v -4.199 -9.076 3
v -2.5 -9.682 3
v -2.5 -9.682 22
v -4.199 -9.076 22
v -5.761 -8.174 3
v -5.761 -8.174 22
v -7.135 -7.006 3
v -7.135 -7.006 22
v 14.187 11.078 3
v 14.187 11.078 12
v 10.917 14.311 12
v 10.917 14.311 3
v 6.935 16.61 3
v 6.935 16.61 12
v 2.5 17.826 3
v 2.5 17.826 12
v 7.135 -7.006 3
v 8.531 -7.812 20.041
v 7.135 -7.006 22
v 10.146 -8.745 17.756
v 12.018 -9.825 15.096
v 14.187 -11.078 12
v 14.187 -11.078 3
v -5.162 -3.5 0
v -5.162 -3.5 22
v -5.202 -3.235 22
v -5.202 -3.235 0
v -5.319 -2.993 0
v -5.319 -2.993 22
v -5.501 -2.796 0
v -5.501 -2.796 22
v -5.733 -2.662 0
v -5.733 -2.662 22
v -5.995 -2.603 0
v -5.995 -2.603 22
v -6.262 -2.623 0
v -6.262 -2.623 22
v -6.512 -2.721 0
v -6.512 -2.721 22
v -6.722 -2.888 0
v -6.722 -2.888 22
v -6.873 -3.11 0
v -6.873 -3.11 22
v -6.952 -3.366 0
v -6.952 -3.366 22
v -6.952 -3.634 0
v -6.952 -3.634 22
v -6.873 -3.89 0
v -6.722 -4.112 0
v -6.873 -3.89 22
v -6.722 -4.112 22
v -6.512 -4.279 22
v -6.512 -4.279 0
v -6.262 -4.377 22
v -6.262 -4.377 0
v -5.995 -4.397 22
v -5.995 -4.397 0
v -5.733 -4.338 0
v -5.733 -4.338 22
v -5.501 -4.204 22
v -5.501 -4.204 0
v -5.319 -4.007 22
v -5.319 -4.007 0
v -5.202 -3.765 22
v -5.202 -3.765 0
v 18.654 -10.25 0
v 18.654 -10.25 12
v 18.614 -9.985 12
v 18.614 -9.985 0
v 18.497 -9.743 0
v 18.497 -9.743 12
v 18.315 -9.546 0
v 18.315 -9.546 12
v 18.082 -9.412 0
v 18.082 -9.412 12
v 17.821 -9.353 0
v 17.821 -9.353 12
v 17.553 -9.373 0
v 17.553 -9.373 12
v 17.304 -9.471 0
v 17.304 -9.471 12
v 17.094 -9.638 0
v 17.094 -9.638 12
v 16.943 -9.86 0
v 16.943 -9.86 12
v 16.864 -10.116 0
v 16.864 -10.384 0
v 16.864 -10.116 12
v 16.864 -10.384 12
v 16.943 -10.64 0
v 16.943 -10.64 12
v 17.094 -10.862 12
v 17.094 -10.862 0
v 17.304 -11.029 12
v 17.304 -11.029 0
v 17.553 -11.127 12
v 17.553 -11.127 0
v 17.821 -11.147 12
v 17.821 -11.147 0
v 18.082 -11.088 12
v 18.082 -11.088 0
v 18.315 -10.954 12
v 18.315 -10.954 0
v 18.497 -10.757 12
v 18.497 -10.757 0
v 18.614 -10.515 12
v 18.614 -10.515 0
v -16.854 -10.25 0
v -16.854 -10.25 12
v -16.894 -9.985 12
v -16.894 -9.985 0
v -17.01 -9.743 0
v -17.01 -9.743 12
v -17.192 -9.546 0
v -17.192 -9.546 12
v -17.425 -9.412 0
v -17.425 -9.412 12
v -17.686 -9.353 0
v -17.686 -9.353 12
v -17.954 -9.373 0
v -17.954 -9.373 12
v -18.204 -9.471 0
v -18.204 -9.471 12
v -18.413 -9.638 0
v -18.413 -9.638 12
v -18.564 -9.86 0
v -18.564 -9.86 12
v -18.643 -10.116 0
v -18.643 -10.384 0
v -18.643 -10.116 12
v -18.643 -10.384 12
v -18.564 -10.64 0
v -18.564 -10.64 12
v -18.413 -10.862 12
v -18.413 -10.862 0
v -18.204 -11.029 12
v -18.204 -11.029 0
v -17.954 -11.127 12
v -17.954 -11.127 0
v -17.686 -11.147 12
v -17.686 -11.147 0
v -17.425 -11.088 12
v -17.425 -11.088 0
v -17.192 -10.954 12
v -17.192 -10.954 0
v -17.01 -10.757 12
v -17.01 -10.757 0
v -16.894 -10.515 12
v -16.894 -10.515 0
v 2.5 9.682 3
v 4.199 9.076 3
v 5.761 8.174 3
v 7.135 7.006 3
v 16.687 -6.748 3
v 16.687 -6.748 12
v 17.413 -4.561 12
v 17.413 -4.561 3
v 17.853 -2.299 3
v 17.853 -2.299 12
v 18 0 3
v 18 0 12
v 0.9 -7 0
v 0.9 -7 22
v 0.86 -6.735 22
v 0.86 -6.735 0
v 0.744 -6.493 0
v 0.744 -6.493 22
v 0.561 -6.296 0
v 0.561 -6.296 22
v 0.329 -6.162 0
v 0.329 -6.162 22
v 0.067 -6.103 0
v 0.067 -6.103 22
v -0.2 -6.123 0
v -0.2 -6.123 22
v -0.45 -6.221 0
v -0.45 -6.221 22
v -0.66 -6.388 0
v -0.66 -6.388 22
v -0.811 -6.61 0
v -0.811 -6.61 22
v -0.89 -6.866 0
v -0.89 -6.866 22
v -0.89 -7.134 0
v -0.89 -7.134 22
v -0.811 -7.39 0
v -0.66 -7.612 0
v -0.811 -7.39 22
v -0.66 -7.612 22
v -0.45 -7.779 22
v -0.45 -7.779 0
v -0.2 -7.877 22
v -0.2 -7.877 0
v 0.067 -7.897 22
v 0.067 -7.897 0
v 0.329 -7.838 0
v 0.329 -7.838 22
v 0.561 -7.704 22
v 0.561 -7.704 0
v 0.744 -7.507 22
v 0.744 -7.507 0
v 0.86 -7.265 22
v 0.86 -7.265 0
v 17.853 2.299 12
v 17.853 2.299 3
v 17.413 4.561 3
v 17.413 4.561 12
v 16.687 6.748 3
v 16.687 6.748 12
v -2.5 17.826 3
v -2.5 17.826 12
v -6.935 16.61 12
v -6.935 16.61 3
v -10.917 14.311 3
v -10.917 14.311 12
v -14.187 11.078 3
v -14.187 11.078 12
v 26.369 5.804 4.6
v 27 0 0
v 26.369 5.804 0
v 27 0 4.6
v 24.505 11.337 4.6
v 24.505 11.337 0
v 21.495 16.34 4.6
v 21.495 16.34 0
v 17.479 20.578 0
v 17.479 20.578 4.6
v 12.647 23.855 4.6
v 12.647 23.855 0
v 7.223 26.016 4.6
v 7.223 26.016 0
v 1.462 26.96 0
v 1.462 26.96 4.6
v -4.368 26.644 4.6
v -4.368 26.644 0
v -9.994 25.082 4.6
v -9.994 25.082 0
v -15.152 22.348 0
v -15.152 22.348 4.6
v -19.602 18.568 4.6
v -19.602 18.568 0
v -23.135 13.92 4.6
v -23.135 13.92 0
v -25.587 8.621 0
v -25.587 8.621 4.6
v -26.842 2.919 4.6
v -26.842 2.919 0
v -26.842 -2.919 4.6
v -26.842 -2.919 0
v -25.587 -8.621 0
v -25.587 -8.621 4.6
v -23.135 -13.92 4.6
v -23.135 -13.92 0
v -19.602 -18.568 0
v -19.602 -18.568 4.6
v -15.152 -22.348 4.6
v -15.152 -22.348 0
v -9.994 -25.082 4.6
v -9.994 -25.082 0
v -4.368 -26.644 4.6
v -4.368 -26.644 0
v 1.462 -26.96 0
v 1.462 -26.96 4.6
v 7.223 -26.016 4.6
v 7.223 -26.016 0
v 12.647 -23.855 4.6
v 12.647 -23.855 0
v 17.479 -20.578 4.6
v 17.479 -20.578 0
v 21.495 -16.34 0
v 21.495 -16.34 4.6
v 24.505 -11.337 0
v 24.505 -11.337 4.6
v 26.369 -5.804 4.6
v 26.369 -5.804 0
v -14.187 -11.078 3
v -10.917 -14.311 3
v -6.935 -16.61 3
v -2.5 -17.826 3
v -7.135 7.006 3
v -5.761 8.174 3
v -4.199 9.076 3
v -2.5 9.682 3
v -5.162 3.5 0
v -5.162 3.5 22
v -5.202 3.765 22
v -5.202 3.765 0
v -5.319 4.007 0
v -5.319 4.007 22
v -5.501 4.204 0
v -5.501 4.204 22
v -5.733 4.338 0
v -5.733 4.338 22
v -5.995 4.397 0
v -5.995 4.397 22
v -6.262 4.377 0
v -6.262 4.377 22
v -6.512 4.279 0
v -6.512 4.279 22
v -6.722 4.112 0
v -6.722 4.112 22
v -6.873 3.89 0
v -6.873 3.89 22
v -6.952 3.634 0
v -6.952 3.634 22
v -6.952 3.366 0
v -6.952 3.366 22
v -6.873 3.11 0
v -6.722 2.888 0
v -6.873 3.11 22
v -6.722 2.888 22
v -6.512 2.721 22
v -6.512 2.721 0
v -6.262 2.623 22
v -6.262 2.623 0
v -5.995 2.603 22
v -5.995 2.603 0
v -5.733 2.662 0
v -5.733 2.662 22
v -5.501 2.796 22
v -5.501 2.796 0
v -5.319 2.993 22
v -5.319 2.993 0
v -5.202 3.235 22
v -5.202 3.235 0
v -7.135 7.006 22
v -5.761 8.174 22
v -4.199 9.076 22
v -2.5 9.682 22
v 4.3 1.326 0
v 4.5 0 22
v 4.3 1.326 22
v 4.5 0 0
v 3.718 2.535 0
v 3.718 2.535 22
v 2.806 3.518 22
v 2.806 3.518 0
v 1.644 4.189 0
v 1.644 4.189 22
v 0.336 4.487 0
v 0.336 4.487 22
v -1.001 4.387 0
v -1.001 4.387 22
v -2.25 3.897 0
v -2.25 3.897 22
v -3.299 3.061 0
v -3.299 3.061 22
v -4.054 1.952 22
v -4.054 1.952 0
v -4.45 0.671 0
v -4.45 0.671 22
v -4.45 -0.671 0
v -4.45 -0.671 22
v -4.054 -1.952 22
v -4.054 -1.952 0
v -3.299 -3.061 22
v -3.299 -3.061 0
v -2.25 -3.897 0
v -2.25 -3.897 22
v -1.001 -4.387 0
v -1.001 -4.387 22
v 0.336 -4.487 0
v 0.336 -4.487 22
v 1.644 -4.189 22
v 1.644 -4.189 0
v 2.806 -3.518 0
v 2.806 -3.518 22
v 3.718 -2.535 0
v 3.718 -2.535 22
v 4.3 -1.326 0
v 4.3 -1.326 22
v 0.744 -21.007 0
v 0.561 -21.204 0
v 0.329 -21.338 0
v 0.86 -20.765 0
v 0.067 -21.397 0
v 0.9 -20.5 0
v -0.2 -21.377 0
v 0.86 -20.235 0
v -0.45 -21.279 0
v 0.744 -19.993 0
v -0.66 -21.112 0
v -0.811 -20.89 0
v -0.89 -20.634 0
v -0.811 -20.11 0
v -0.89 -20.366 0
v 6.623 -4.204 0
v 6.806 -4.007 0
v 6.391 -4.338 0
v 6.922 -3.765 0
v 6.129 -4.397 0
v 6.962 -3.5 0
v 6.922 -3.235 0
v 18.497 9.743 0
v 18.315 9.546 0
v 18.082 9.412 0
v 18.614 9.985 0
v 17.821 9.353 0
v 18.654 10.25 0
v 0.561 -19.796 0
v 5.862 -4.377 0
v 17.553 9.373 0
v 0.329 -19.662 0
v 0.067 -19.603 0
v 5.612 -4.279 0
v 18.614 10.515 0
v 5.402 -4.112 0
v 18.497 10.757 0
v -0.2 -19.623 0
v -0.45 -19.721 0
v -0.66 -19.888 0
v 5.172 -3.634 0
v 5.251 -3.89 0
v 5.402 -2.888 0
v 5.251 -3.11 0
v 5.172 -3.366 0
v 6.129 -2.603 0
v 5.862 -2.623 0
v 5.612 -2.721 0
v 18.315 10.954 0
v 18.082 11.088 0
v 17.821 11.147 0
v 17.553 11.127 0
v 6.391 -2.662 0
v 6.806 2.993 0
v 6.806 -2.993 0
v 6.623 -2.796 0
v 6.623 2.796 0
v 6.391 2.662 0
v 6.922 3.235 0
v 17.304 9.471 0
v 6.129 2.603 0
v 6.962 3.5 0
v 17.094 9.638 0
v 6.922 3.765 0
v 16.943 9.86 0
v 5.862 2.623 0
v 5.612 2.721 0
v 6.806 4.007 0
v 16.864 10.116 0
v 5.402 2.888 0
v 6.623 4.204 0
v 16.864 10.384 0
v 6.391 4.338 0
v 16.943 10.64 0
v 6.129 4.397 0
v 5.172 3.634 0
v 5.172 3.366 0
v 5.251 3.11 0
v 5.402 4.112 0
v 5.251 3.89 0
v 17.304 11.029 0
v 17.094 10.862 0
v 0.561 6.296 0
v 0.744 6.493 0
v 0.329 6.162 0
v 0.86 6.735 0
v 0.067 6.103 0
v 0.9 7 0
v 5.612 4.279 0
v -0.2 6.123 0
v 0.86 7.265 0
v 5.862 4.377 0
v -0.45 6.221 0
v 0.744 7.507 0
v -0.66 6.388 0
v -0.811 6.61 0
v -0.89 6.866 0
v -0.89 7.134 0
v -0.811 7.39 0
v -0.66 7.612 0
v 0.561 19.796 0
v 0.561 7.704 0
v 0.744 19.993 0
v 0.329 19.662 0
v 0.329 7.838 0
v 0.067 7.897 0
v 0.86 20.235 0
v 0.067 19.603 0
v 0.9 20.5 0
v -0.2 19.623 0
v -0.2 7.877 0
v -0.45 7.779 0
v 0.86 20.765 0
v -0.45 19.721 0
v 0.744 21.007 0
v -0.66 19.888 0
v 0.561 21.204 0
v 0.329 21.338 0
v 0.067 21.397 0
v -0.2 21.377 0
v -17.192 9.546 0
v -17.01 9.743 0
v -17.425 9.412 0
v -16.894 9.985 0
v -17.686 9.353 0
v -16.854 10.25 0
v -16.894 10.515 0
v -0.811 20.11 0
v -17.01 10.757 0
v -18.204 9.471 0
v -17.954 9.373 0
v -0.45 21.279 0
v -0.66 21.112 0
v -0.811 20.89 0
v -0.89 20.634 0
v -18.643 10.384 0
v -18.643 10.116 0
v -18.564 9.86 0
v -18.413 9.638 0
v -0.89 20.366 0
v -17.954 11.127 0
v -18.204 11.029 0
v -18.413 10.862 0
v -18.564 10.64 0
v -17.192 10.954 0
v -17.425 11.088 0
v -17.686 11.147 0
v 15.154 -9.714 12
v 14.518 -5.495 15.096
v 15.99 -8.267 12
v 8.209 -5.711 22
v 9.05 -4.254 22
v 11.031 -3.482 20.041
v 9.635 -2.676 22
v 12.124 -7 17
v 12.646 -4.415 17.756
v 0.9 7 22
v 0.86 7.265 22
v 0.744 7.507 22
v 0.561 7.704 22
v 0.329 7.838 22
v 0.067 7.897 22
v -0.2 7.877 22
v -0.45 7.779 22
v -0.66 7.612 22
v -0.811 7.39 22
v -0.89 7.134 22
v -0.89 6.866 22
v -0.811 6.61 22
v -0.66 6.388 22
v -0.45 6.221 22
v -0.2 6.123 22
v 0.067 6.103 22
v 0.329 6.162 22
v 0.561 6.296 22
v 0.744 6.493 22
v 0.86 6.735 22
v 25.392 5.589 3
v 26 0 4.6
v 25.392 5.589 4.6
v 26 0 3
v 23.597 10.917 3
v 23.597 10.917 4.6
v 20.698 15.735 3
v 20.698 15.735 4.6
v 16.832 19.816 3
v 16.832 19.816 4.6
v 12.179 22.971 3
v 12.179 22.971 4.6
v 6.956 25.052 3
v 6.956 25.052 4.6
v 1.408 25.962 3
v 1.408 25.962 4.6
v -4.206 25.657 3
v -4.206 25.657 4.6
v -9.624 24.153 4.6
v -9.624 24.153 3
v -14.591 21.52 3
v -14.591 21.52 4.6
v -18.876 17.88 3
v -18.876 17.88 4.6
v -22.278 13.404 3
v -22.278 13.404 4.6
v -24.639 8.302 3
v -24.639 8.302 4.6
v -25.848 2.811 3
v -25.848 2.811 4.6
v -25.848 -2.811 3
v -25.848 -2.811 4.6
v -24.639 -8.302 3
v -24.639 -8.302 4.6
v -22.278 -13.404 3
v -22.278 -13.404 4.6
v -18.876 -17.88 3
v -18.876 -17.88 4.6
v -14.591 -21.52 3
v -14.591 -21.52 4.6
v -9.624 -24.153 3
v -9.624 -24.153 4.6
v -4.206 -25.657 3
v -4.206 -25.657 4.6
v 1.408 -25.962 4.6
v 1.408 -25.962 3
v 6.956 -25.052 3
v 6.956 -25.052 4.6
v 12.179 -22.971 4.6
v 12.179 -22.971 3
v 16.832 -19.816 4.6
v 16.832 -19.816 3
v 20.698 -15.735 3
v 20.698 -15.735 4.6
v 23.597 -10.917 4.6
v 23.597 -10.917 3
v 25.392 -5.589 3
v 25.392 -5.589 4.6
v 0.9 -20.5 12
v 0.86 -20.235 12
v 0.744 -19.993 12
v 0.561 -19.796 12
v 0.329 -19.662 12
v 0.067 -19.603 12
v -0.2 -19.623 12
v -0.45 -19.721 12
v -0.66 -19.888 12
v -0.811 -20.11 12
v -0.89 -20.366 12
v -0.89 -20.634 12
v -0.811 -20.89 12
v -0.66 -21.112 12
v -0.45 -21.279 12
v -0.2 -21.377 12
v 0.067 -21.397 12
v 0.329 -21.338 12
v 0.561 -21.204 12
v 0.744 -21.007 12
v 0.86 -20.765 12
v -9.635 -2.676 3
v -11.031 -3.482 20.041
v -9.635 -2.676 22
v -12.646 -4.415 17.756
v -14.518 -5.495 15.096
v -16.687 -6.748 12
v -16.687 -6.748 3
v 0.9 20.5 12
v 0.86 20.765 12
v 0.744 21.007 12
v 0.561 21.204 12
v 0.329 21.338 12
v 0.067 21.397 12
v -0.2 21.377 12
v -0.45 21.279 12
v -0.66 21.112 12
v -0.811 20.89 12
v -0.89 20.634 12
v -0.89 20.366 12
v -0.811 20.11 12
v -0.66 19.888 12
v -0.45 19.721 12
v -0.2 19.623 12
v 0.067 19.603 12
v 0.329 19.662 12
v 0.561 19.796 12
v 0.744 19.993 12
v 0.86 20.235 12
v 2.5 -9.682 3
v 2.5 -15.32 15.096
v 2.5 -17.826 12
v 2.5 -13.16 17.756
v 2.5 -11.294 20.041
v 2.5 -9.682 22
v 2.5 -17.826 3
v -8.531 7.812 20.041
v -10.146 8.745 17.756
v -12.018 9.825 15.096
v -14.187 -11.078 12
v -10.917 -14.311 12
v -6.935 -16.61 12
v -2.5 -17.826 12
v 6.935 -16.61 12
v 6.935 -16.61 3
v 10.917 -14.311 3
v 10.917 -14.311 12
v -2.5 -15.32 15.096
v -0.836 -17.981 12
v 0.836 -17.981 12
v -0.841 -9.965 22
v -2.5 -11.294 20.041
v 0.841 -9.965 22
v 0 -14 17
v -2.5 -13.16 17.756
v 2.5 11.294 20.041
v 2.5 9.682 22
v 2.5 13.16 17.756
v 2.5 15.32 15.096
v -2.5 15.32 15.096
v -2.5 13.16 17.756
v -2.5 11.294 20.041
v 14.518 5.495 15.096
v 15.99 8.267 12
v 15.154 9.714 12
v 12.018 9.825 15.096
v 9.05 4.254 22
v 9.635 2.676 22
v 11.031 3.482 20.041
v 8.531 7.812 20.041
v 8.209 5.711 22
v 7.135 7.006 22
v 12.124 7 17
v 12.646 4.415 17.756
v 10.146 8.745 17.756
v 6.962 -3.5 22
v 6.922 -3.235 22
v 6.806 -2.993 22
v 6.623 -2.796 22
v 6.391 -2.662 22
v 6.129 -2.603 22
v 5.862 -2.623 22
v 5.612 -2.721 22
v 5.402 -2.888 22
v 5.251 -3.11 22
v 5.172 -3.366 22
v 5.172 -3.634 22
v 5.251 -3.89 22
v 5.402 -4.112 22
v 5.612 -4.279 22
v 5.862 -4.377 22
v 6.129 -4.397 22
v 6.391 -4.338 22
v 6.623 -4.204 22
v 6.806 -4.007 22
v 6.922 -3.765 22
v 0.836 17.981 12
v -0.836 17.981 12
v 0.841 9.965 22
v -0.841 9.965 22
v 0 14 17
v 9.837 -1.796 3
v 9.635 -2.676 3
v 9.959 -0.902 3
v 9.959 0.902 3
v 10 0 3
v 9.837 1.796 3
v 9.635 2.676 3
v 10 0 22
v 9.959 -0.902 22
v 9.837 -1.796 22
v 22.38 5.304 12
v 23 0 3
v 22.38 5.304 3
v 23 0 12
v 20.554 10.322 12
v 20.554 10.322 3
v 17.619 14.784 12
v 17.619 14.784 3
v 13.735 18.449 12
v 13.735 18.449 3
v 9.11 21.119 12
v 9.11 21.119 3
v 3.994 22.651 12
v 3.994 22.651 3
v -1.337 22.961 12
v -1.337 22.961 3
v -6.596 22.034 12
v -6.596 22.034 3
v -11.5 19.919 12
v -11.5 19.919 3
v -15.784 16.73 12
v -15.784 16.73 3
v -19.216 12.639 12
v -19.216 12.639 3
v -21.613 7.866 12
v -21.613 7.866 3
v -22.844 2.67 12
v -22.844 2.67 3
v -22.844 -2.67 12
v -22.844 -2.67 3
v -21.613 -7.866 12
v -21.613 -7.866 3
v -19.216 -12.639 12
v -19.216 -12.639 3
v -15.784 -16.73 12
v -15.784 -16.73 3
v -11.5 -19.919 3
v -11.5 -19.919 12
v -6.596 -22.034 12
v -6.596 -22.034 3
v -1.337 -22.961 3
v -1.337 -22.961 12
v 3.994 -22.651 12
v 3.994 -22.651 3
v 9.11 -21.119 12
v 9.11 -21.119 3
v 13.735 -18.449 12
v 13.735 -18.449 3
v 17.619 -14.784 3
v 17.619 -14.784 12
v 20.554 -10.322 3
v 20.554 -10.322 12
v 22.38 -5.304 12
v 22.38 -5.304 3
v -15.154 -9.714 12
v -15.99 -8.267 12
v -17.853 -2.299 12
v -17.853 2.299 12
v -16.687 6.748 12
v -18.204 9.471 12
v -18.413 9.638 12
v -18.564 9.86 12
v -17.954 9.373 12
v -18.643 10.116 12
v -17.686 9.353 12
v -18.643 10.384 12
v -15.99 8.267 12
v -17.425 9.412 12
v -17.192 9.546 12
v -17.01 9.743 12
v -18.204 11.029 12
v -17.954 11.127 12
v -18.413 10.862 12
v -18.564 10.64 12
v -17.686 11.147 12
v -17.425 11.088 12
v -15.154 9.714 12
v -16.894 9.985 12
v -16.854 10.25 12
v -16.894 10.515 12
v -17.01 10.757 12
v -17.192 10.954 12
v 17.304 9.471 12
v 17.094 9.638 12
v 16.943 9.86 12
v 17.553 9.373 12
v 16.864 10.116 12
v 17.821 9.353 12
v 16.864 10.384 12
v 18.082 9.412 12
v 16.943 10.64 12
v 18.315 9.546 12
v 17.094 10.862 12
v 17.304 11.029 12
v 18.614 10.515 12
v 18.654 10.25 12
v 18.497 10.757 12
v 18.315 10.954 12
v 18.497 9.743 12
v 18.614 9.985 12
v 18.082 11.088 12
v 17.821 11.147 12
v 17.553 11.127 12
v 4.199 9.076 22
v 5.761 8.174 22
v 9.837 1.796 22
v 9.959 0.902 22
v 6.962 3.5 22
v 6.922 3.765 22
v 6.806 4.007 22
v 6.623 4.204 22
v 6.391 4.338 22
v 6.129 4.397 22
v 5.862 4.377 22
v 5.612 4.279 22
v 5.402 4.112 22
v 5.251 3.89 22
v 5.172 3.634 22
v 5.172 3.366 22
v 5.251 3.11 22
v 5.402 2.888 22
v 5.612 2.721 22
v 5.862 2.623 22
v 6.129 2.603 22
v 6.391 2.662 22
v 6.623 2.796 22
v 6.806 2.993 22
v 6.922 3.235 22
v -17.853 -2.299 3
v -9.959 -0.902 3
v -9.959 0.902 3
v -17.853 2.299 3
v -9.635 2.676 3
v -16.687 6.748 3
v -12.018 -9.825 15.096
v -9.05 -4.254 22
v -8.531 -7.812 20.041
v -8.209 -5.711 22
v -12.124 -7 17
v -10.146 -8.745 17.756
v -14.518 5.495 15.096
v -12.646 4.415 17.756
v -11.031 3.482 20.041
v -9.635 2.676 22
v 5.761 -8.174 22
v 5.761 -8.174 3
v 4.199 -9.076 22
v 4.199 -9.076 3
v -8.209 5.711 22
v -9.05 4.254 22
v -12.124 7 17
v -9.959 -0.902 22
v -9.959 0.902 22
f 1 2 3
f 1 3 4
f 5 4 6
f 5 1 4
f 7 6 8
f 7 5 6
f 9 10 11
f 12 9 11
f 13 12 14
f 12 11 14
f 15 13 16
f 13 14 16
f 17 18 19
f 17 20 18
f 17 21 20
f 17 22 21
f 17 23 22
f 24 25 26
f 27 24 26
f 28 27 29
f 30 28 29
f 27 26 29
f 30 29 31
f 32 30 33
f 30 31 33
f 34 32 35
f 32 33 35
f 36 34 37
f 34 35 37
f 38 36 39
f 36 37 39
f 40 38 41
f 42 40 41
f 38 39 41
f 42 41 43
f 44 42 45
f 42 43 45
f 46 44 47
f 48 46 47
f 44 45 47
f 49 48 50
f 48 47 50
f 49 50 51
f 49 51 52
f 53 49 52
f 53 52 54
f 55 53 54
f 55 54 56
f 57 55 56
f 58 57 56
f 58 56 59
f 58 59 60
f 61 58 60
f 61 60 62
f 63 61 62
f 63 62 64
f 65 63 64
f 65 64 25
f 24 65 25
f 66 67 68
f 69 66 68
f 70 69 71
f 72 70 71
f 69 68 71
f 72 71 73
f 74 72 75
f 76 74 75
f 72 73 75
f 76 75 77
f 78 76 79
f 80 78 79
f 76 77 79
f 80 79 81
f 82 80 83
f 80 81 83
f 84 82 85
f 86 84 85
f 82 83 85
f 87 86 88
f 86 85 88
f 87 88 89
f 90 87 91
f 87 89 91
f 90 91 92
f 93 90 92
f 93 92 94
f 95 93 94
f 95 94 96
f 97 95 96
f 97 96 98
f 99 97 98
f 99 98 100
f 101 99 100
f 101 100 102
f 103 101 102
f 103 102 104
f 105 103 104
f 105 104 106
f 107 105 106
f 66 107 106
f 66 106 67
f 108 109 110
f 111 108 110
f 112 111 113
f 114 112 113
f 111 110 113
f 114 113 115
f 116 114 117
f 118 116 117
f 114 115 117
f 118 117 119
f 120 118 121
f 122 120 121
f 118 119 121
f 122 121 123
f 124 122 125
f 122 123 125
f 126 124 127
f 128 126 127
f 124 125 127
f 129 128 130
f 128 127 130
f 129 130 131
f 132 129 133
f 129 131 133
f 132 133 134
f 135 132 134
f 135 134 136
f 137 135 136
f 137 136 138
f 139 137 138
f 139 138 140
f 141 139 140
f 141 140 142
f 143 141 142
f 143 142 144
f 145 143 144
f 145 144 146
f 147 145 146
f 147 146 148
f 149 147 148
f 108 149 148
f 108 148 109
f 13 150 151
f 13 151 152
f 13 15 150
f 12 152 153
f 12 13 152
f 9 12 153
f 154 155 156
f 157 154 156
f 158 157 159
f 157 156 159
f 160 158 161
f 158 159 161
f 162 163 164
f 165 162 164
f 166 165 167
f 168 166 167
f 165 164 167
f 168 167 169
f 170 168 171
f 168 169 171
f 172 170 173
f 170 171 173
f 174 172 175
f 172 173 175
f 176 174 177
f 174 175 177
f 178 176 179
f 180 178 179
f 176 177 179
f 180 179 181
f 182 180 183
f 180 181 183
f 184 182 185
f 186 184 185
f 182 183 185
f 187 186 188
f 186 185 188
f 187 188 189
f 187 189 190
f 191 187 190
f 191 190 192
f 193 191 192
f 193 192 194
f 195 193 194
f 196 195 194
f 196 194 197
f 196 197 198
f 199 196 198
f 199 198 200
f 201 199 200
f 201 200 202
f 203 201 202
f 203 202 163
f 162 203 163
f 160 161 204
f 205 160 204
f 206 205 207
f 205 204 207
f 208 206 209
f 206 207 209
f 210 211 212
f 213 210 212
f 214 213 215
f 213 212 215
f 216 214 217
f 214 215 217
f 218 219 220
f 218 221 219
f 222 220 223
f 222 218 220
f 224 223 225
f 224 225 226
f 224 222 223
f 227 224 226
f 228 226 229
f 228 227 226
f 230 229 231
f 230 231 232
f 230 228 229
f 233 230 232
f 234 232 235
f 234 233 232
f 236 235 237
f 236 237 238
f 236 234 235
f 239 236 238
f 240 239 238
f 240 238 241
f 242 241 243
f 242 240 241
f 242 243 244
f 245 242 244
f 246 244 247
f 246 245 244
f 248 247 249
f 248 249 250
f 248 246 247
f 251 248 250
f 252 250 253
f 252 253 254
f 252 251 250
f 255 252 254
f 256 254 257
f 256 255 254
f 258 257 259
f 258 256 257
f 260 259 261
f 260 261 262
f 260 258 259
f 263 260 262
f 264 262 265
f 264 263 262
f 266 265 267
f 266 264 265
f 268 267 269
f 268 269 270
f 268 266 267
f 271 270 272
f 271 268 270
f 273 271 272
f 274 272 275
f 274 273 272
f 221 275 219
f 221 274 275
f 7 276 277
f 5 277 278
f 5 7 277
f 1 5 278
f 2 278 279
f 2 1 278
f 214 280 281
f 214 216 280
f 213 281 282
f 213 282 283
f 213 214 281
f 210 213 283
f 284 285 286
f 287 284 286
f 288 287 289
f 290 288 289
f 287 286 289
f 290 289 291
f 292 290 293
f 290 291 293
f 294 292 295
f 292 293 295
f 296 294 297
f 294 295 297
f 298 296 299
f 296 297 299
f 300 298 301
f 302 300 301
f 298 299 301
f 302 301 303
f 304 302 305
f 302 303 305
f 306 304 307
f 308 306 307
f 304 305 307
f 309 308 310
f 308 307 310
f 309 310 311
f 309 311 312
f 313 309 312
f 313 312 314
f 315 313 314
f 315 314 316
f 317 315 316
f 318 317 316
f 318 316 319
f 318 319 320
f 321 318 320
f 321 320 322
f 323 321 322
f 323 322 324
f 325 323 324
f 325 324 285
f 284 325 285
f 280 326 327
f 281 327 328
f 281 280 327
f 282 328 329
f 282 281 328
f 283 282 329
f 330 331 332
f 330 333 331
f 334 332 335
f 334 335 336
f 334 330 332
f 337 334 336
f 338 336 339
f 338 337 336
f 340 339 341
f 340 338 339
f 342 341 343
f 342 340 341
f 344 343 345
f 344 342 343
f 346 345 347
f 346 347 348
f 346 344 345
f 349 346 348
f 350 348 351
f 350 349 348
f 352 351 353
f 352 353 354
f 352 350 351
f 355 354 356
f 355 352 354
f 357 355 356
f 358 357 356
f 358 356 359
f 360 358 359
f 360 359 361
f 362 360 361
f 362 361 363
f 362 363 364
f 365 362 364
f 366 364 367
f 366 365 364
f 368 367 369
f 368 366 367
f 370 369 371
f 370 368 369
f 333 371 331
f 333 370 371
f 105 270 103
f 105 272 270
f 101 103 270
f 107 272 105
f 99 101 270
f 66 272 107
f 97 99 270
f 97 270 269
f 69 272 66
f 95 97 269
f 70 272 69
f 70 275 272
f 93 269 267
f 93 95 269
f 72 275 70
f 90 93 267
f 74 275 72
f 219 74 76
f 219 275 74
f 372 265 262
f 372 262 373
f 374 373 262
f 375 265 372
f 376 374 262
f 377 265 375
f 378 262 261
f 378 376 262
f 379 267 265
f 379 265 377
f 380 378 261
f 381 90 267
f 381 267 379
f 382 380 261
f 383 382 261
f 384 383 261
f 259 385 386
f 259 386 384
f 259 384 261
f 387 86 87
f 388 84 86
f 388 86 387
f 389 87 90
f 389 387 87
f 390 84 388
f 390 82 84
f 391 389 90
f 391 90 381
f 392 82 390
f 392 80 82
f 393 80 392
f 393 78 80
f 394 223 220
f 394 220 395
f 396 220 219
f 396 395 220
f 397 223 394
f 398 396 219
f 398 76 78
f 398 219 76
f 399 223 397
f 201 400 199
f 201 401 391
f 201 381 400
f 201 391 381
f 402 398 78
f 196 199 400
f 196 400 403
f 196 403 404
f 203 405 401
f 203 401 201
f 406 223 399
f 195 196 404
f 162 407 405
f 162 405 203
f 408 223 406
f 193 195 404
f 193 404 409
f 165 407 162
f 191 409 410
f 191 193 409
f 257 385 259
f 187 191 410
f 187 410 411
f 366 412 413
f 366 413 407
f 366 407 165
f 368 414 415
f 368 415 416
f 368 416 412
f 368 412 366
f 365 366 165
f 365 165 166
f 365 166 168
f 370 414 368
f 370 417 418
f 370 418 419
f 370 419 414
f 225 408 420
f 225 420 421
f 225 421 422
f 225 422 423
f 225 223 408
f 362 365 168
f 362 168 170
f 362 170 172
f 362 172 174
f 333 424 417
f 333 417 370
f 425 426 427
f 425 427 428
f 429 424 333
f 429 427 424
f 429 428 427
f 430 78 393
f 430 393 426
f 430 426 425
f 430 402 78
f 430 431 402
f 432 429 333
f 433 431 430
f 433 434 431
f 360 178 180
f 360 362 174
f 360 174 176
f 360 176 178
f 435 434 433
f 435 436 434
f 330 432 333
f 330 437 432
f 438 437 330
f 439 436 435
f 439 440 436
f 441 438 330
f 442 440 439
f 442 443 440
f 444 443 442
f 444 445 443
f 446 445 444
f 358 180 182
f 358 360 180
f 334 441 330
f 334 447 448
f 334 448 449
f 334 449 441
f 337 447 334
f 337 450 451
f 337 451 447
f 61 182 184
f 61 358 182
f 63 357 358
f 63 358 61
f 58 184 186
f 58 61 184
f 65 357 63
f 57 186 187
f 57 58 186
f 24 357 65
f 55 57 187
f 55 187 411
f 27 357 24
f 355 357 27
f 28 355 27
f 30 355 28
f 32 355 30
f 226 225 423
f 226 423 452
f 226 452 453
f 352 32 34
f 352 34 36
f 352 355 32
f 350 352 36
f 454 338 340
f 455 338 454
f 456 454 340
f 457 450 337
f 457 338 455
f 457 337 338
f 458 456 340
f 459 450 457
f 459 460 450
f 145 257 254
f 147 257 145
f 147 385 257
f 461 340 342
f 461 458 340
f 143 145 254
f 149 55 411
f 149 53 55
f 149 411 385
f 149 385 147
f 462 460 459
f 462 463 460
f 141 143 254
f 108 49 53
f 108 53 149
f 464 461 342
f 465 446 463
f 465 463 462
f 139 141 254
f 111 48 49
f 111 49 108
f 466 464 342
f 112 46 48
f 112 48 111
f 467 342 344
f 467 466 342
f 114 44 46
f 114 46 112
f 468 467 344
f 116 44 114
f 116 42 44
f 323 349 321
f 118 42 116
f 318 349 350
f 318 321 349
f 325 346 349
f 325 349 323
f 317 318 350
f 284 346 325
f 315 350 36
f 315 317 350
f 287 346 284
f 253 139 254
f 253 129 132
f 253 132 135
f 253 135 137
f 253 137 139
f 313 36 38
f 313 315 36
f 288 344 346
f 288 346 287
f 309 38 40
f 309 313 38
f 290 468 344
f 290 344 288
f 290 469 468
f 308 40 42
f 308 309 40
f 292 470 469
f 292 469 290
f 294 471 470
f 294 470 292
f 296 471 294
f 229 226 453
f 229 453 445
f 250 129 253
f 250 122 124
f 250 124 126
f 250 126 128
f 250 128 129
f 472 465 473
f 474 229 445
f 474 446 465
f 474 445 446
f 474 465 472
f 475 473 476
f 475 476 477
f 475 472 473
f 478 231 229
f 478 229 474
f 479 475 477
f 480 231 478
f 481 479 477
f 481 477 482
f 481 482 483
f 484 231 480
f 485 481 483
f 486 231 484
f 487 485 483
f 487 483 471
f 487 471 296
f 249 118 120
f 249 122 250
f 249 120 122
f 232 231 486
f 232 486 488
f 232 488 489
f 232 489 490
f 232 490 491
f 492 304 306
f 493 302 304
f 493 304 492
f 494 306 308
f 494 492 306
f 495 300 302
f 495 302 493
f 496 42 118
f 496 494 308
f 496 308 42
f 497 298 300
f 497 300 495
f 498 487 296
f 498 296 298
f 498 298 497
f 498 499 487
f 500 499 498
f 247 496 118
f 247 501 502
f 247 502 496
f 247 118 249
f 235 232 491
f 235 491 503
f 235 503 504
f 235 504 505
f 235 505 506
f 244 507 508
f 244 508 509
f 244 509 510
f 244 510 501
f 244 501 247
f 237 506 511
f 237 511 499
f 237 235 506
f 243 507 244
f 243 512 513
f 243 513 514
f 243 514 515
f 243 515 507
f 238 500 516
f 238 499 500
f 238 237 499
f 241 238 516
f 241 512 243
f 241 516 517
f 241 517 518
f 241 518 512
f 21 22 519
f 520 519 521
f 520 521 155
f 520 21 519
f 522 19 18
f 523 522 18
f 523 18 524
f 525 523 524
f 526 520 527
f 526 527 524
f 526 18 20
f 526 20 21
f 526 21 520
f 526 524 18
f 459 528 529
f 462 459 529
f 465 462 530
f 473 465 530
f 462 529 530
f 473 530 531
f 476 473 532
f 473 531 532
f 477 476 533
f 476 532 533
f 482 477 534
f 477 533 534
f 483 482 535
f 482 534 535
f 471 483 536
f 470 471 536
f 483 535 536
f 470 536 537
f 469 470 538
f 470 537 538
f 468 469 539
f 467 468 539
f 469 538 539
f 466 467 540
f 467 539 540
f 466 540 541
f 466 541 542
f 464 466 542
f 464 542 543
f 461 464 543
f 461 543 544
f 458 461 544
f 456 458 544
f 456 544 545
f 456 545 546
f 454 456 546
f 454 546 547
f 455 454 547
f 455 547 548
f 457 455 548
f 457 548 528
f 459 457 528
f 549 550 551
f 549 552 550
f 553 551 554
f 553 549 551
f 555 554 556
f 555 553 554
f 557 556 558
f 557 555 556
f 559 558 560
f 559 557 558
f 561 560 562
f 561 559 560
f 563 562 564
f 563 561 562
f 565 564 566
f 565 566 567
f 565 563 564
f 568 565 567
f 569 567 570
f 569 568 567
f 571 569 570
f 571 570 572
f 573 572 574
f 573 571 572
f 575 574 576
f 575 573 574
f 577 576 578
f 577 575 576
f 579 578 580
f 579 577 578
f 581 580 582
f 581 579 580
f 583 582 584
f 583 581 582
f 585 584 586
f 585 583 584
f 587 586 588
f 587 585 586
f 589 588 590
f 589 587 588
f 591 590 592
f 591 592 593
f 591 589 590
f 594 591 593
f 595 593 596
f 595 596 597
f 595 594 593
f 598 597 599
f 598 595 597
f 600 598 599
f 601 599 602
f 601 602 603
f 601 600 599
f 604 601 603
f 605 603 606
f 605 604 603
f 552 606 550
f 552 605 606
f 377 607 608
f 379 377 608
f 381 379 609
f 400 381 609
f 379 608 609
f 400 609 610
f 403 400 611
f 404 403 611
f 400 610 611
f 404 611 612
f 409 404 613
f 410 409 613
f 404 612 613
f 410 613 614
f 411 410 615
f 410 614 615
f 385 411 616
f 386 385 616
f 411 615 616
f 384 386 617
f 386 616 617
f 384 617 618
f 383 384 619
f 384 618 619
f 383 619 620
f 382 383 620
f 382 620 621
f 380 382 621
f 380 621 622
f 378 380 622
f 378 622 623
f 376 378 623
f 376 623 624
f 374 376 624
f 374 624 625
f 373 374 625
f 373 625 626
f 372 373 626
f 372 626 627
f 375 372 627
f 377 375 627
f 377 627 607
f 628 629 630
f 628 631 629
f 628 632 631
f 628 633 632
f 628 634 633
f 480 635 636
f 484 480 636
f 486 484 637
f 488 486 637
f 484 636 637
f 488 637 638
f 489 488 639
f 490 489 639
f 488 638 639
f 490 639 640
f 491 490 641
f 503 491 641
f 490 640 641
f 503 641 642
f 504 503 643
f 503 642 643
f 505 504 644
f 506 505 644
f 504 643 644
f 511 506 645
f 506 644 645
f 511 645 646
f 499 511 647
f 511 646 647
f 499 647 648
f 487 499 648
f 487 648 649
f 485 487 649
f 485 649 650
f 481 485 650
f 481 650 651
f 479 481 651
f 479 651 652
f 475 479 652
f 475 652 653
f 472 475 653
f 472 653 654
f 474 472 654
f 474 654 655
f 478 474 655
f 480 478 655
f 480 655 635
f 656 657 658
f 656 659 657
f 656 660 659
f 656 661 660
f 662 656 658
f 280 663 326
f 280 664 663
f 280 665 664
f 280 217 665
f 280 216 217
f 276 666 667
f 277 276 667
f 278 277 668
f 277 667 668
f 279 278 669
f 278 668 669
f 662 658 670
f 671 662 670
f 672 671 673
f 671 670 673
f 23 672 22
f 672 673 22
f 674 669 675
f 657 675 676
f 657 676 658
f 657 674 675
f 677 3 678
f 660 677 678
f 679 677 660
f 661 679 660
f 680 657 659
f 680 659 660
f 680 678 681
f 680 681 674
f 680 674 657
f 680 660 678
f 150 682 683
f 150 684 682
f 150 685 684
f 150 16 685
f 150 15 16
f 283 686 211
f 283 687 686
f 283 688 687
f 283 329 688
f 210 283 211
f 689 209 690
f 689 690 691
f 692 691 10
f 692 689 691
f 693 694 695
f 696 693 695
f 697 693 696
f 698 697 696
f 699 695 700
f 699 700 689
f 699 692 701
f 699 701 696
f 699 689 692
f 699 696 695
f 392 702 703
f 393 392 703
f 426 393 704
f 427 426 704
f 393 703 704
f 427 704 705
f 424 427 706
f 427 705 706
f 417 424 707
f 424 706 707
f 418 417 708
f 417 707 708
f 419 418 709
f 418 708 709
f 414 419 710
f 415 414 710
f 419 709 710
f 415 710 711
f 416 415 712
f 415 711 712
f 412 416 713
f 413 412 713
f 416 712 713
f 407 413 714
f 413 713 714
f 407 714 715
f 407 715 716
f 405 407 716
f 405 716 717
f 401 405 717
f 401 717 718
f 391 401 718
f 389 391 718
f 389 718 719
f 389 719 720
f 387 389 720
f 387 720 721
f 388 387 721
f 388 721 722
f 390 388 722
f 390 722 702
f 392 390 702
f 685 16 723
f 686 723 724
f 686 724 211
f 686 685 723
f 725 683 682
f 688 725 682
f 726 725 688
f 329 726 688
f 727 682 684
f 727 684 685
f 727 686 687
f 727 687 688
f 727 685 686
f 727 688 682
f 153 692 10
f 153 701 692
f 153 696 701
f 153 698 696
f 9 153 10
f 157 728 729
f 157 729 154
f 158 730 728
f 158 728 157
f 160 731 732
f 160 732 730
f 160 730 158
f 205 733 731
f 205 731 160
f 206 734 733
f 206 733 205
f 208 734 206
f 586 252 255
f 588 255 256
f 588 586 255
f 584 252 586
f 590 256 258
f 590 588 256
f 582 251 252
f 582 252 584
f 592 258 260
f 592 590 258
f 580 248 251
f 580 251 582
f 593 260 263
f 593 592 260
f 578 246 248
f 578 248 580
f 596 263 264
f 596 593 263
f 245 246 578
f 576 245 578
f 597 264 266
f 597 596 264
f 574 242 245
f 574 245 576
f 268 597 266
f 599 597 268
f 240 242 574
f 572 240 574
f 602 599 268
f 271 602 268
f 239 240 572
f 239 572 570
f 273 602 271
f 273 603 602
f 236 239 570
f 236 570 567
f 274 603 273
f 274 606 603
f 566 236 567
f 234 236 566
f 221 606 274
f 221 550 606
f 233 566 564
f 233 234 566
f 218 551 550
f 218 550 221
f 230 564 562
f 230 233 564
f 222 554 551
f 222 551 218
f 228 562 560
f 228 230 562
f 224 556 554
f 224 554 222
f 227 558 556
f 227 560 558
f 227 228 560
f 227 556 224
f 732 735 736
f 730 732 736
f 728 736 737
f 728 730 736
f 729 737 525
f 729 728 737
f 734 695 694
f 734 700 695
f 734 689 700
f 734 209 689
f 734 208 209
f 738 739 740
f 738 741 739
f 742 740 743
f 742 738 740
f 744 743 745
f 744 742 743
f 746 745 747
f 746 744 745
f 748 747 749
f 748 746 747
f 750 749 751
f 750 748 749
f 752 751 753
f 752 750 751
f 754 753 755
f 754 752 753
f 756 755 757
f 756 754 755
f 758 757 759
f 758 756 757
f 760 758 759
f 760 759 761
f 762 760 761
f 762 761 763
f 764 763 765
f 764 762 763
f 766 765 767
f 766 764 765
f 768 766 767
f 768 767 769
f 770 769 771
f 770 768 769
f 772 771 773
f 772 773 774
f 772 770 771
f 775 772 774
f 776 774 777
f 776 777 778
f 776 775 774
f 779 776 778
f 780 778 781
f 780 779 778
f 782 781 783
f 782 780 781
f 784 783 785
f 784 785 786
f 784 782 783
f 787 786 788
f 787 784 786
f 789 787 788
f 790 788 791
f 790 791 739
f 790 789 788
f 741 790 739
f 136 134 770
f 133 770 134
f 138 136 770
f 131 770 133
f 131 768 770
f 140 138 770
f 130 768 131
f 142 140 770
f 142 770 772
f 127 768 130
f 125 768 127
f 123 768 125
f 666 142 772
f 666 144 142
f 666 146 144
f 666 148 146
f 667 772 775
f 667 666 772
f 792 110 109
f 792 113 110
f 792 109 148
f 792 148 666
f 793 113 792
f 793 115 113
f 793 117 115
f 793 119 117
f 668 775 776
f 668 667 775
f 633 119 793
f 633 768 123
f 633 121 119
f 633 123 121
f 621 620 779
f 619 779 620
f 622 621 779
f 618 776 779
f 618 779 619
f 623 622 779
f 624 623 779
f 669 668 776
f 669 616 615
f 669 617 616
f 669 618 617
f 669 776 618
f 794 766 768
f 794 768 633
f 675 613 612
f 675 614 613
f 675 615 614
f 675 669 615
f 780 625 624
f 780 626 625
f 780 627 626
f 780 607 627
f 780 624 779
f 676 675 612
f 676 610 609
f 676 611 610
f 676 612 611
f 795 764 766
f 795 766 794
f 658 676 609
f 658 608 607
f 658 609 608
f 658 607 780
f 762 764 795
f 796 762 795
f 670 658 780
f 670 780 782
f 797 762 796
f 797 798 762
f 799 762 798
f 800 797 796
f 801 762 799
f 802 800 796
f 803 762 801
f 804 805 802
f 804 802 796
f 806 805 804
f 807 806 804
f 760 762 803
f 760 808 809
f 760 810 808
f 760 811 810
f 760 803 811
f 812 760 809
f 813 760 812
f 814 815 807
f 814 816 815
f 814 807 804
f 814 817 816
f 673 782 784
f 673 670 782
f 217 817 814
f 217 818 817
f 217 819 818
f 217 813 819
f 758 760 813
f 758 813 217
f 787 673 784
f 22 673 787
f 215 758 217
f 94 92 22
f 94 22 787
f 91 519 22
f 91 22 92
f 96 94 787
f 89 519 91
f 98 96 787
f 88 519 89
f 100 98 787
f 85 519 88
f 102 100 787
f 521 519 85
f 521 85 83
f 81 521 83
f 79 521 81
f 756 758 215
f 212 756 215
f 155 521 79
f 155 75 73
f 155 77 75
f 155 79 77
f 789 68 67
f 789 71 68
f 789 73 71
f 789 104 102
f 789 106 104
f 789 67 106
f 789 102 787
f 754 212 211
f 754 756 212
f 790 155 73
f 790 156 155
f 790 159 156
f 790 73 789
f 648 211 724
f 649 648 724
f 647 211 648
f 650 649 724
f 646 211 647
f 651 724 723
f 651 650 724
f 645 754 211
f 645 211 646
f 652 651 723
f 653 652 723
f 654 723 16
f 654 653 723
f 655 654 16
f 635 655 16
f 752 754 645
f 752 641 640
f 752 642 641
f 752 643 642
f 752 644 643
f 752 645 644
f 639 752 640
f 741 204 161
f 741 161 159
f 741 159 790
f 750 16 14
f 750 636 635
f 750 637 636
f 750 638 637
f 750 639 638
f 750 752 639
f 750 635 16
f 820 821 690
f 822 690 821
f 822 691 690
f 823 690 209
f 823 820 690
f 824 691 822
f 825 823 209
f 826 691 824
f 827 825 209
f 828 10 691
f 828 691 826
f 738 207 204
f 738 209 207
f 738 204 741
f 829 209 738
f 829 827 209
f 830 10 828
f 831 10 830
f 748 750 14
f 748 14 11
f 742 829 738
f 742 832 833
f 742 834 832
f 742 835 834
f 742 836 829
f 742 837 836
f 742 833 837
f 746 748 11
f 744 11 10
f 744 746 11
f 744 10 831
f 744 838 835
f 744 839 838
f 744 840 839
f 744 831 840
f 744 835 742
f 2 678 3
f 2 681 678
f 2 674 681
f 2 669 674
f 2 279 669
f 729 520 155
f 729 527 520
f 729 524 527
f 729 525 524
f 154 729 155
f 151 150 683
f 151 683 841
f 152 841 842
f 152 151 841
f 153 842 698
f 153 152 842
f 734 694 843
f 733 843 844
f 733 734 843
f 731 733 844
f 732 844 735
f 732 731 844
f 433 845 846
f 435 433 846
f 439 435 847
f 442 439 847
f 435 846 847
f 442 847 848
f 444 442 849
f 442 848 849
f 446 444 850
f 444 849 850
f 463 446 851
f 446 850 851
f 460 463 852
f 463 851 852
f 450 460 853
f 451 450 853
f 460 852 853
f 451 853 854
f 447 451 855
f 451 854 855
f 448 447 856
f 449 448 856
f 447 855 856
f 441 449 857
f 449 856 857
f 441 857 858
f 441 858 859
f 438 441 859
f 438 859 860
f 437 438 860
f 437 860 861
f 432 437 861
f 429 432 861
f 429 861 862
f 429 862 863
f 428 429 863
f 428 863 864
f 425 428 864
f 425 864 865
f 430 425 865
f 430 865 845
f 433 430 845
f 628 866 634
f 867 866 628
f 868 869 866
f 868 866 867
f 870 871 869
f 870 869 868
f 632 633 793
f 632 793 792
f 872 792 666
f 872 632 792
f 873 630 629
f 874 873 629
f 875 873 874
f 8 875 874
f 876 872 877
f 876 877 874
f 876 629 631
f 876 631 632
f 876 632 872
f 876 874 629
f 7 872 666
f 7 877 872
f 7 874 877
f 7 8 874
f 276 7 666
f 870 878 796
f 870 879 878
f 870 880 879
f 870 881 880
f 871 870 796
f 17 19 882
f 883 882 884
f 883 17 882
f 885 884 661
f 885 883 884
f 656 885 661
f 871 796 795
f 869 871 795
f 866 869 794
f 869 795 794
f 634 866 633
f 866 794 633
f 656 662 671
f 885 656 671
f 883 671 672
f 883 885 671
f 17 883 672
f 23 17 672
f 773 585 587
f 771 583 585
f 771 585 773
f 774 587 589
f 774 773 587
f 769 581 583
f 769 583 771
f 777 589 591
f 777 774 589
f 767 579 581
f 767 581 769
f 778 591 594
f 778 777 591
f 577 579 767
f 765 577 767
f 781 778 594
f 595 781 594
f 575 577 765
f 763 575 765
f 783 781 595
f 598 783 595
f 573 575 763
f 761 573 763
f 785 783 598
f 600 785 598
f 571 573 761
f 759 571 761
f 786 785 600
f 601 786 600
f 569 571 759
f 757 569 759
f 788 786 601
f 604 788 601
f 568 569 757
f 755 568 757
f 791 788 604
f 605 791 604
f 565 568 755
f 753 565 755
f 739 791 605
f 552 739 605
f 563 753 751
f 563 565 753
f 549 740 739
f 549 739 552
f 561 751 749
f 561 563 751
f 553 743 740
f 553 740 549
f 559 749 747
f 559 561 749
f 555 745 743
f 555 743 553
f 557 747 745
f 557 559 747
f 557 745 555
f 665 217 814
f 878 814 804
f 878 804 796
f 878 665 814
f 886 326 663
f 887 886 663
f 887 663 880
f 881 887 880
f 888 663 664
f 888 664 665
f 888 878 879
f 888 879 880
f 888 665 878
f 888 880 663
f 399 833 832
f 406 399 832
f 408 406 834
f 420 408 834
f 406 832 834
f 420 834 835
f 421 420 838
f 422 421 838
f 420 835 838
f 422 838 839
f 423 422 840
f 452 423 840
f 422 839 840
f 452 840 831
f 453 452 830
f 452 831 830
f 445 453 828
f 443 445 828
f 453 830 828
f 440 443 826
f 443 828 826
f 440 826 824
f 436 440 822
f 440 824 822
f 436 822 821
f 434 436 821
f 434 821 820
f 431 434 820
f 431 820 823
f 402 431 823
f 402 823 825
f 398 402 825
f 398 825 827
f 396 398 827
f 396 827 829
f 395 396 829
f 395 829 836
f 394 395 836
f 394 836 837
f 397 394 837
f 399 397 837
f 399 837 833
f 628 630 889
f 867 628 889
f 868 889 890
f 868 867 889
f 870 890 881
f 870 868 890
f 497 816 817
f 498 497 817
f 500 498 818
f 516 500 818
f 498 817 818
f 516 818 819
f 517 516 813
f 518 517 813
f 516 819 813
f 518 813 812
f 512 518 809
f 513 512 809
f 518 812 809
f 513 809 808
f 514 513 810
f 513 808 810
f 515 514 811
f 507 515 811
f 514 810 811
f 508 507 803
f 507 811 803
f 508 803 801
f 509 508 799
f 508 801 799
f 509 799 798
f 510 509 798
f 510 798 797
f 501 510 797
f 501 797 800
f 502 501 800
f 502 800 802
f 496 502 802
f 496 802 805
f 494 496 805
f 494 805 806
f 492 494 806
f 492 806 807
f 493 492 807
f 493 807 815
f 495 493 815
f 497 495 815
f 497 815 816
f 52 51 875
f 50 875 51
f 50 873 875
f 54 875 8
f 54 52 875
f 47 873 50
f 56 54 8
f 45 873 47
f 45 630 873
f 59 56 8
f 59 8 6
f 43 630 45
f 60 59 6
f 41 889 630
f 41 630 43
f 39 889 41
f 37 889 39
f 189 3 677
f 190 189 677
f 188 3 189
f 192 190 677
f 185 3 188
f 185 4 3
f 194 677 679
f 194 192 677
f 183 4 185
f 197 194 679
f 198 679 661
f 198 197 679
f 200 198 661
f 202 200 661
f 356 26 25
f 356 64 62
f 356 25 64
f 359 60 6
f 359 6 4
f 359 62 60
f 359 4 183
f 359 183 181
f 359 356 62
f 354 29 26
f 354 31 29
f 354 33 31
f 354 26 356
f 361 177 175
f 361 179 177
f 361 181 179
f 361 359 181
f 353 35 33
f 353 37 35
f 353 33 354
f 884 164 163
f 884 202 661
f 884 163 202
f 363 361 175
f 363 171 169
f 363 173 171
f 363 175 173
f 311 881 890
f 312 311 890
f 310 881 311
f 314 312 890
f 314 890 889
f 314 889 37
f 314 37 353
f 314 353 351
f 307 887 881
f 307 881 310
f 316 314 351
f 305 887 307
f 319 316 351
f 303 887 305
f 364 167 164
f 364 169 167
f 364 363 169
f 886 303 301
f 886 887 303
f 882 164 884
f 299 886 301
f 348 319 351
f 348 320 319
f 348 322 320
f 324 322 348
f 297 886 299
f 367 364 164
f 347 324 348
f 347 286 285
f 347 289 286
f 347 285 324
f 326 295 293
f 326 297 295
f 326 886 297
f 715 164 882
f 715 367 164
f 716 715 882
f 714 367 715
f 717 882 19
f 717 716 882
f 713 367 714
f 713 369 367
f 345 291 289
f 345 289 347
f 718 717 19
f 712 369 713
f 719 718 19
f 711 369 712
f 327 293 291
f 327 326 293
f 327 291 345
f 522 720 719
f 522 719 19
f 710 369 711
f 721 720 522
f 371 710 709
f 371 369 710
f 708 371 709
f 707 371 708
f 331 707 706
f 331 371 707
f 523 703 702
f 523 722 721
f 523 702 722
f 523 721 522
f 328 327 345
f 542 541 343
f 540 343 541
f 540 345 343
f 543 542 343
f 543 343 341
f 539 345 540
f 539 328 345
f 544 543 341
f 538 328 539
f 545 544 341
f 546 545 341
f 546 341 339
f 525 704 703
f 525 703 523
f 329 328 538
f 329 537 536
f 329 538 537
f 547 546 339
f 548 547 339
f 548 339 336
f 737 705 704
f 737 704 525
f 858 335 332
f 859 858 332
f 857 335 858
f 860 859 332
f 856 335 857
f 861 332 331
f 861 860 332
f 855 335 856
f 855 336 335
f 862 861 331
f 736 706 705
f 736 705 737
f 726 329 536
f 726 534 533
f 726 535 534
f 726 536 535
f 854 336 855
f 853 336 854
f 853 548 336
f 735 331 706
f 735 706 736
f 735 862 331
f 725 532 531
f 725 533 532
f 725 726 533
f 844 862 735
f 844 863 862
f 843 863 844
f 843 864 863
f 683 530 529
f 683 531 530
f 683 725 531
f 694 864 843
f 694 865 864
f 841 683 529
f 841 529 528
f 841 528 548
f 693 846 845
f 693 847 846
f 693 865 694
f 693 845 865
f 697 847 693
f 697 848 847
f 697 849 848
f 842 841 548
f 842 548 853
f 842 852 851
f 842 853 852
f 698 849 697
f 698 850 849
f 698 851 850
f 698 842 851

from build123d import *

# Parameters (mm, degrees)
F3_DEPTH      = 25
F3_DEPTH_BACK = 9
F4_R          = 0.9
F5_DEPTH      = 22.001


with BuildPart() as f1:
    # F0 (on Front) → F1 (revolve)
    with BuildSketch(Plane.XZ):
        Polygon((4.5, 0), (27, 0), (27, 4.6), (26, 4.6), (26, 3), (23, 3), (23, 12), (18, 12), (10, 12), (10, 22), (4.5, 22), align=None)
        Polygon((18, 12), (10, 22), (10, 12), align=None)
    revolve(axis=Axis((0, 0, 11.323432), (0, 0, 1)))

    # F2 (on face) → F3 (cut, two sides)
    with BuildSketch(Plane.XY.offset(12)) as f3_sk:
        with BuildLine():
            ThreePointArc((-7.135255, 7.006293), (-5, 8.660254), (-2.5, 9.682458))
            Line((-2.5, 9.682458), (-2.5, 17.825543))
            ThreePointArc((-2.5, 17.825543), (-9, 15.588457), (-14.187373, 11.077835))
            Line((-14.187373, 11.077835), (-7.135255, 7.006293))
        make_face()
        with BuildLine():
            ThreePointArc((-9.635255, -2.676166), (-10, 0), (-9.635255, 2.676166))
            Line((-9.635255, 2.676166), (-16.687373, 6.747708))
            ThreePointArc((-16.687373, 6.747708), (-18, 0), (-16.687373, -6.747708))
            Line((-16.687373, -6.747708), (-9.635255, -2.676166))
        make_face()
        with BuildLine():
            Line((-2.5, -17.825543), (-2.5, -9.682458))
            ThreePointArc((-2.5, -9.682458), (-5, -8.660254), (-7.135255, -7.006293))
            Line((-7.135255, -7.006293), (-14.187373, -11.077835))
            ThreePointArc((-14.187373, -11.077835), (-9, -15.588457), (-2.5, -17.825543))
        make_face()
        with BuildLine():
            Line((14.187373, -11.077835), (7.135255, -7.006293))
            ThreePointArc((7.135255, -7.006293), (5, -8.660254), (2.5, -9.682458))
            Line((2.5, -9.682458), (2.5, -17.825543))
            ThreePointArc((2.5, -17.825543), (9, -15.588457), (14.187373, -11.077835))
        make_face()
        with BuildLine():
            ThreePointArc((9.635255, 2.676166), (9.908394, 1.350454), (10, 0))
            ThreePointArc((10, 0), (9.908394, -1.350454), (9.635255, -2.676166))
            Line((9.635255, -2.676166), (16.687373, -6.747708))
            ThreePointArc((16.687373, -6.747708), (17.668796, -3.437097), (18, 0))
            ThreePointArc((18, 0), (17.668796, 3.437097), (16.687373, 6.747708))
            Line((16.687373, 6.747708), (9.635255, 2.676166))
        make_face()
        with BuildLine():
            ThreePointArc((2.5, 9.682458), (5, 8.660254), (7.135255, 7.006293))
            Line((7.135255, 7.006293), (14.187373, 11.077835))
            ThreePointArc((14.187373, 11.077835), (9, 15.588457), (2.5, 17.825543))
            Line((2.5, 17.825543), (2.5, 9.682458))
        make_face()
    extrude(amount=F3_DEPTH, mode=Mode.SUBTRACT)
    extrude(f3_sk.sketch, amount=-F3_DEPTH_BACK, mode=Mode.SUBTRACT)

    # F4 (on face) → F5 (cut, through all)
    with BuildSketch(Plane.XY.offset(22)):
        with Locations((0, 7)):
            Circle(F4_R)
        with Locations((0, 20.5)):
            Circle(F4_R)
        with Locations((-6.062178, 3.5)):
            Circle(F4_R)
        with Locations((-17.753521, 10.25)):
            Circle(F4_R)
        with Locations((-6.062178, -3.5)):
            Circle(F4_R)
        with Locations((-17.753521, -10.25)):
            Circle(F4_R)
        with Locations((0, -7)):
            Circle(F4_R)
        with Locations((0, -20.5)):
            Circle(F4_R)
        with Locations((6.062178, -3.5)):
            Circle(F4_R)
        with Locations((17.753521, -10.25)):
            Circle(F4_R)
        with Locations((6.062178, 3.5)):
            Circle(F4_R)
        with Locations((17.753521, 10.25)):
            Circle(F4_R)
    extrude(amount=-F5_DEPTH, mode=Mode.SUBTRACT)


solid = f1.part
